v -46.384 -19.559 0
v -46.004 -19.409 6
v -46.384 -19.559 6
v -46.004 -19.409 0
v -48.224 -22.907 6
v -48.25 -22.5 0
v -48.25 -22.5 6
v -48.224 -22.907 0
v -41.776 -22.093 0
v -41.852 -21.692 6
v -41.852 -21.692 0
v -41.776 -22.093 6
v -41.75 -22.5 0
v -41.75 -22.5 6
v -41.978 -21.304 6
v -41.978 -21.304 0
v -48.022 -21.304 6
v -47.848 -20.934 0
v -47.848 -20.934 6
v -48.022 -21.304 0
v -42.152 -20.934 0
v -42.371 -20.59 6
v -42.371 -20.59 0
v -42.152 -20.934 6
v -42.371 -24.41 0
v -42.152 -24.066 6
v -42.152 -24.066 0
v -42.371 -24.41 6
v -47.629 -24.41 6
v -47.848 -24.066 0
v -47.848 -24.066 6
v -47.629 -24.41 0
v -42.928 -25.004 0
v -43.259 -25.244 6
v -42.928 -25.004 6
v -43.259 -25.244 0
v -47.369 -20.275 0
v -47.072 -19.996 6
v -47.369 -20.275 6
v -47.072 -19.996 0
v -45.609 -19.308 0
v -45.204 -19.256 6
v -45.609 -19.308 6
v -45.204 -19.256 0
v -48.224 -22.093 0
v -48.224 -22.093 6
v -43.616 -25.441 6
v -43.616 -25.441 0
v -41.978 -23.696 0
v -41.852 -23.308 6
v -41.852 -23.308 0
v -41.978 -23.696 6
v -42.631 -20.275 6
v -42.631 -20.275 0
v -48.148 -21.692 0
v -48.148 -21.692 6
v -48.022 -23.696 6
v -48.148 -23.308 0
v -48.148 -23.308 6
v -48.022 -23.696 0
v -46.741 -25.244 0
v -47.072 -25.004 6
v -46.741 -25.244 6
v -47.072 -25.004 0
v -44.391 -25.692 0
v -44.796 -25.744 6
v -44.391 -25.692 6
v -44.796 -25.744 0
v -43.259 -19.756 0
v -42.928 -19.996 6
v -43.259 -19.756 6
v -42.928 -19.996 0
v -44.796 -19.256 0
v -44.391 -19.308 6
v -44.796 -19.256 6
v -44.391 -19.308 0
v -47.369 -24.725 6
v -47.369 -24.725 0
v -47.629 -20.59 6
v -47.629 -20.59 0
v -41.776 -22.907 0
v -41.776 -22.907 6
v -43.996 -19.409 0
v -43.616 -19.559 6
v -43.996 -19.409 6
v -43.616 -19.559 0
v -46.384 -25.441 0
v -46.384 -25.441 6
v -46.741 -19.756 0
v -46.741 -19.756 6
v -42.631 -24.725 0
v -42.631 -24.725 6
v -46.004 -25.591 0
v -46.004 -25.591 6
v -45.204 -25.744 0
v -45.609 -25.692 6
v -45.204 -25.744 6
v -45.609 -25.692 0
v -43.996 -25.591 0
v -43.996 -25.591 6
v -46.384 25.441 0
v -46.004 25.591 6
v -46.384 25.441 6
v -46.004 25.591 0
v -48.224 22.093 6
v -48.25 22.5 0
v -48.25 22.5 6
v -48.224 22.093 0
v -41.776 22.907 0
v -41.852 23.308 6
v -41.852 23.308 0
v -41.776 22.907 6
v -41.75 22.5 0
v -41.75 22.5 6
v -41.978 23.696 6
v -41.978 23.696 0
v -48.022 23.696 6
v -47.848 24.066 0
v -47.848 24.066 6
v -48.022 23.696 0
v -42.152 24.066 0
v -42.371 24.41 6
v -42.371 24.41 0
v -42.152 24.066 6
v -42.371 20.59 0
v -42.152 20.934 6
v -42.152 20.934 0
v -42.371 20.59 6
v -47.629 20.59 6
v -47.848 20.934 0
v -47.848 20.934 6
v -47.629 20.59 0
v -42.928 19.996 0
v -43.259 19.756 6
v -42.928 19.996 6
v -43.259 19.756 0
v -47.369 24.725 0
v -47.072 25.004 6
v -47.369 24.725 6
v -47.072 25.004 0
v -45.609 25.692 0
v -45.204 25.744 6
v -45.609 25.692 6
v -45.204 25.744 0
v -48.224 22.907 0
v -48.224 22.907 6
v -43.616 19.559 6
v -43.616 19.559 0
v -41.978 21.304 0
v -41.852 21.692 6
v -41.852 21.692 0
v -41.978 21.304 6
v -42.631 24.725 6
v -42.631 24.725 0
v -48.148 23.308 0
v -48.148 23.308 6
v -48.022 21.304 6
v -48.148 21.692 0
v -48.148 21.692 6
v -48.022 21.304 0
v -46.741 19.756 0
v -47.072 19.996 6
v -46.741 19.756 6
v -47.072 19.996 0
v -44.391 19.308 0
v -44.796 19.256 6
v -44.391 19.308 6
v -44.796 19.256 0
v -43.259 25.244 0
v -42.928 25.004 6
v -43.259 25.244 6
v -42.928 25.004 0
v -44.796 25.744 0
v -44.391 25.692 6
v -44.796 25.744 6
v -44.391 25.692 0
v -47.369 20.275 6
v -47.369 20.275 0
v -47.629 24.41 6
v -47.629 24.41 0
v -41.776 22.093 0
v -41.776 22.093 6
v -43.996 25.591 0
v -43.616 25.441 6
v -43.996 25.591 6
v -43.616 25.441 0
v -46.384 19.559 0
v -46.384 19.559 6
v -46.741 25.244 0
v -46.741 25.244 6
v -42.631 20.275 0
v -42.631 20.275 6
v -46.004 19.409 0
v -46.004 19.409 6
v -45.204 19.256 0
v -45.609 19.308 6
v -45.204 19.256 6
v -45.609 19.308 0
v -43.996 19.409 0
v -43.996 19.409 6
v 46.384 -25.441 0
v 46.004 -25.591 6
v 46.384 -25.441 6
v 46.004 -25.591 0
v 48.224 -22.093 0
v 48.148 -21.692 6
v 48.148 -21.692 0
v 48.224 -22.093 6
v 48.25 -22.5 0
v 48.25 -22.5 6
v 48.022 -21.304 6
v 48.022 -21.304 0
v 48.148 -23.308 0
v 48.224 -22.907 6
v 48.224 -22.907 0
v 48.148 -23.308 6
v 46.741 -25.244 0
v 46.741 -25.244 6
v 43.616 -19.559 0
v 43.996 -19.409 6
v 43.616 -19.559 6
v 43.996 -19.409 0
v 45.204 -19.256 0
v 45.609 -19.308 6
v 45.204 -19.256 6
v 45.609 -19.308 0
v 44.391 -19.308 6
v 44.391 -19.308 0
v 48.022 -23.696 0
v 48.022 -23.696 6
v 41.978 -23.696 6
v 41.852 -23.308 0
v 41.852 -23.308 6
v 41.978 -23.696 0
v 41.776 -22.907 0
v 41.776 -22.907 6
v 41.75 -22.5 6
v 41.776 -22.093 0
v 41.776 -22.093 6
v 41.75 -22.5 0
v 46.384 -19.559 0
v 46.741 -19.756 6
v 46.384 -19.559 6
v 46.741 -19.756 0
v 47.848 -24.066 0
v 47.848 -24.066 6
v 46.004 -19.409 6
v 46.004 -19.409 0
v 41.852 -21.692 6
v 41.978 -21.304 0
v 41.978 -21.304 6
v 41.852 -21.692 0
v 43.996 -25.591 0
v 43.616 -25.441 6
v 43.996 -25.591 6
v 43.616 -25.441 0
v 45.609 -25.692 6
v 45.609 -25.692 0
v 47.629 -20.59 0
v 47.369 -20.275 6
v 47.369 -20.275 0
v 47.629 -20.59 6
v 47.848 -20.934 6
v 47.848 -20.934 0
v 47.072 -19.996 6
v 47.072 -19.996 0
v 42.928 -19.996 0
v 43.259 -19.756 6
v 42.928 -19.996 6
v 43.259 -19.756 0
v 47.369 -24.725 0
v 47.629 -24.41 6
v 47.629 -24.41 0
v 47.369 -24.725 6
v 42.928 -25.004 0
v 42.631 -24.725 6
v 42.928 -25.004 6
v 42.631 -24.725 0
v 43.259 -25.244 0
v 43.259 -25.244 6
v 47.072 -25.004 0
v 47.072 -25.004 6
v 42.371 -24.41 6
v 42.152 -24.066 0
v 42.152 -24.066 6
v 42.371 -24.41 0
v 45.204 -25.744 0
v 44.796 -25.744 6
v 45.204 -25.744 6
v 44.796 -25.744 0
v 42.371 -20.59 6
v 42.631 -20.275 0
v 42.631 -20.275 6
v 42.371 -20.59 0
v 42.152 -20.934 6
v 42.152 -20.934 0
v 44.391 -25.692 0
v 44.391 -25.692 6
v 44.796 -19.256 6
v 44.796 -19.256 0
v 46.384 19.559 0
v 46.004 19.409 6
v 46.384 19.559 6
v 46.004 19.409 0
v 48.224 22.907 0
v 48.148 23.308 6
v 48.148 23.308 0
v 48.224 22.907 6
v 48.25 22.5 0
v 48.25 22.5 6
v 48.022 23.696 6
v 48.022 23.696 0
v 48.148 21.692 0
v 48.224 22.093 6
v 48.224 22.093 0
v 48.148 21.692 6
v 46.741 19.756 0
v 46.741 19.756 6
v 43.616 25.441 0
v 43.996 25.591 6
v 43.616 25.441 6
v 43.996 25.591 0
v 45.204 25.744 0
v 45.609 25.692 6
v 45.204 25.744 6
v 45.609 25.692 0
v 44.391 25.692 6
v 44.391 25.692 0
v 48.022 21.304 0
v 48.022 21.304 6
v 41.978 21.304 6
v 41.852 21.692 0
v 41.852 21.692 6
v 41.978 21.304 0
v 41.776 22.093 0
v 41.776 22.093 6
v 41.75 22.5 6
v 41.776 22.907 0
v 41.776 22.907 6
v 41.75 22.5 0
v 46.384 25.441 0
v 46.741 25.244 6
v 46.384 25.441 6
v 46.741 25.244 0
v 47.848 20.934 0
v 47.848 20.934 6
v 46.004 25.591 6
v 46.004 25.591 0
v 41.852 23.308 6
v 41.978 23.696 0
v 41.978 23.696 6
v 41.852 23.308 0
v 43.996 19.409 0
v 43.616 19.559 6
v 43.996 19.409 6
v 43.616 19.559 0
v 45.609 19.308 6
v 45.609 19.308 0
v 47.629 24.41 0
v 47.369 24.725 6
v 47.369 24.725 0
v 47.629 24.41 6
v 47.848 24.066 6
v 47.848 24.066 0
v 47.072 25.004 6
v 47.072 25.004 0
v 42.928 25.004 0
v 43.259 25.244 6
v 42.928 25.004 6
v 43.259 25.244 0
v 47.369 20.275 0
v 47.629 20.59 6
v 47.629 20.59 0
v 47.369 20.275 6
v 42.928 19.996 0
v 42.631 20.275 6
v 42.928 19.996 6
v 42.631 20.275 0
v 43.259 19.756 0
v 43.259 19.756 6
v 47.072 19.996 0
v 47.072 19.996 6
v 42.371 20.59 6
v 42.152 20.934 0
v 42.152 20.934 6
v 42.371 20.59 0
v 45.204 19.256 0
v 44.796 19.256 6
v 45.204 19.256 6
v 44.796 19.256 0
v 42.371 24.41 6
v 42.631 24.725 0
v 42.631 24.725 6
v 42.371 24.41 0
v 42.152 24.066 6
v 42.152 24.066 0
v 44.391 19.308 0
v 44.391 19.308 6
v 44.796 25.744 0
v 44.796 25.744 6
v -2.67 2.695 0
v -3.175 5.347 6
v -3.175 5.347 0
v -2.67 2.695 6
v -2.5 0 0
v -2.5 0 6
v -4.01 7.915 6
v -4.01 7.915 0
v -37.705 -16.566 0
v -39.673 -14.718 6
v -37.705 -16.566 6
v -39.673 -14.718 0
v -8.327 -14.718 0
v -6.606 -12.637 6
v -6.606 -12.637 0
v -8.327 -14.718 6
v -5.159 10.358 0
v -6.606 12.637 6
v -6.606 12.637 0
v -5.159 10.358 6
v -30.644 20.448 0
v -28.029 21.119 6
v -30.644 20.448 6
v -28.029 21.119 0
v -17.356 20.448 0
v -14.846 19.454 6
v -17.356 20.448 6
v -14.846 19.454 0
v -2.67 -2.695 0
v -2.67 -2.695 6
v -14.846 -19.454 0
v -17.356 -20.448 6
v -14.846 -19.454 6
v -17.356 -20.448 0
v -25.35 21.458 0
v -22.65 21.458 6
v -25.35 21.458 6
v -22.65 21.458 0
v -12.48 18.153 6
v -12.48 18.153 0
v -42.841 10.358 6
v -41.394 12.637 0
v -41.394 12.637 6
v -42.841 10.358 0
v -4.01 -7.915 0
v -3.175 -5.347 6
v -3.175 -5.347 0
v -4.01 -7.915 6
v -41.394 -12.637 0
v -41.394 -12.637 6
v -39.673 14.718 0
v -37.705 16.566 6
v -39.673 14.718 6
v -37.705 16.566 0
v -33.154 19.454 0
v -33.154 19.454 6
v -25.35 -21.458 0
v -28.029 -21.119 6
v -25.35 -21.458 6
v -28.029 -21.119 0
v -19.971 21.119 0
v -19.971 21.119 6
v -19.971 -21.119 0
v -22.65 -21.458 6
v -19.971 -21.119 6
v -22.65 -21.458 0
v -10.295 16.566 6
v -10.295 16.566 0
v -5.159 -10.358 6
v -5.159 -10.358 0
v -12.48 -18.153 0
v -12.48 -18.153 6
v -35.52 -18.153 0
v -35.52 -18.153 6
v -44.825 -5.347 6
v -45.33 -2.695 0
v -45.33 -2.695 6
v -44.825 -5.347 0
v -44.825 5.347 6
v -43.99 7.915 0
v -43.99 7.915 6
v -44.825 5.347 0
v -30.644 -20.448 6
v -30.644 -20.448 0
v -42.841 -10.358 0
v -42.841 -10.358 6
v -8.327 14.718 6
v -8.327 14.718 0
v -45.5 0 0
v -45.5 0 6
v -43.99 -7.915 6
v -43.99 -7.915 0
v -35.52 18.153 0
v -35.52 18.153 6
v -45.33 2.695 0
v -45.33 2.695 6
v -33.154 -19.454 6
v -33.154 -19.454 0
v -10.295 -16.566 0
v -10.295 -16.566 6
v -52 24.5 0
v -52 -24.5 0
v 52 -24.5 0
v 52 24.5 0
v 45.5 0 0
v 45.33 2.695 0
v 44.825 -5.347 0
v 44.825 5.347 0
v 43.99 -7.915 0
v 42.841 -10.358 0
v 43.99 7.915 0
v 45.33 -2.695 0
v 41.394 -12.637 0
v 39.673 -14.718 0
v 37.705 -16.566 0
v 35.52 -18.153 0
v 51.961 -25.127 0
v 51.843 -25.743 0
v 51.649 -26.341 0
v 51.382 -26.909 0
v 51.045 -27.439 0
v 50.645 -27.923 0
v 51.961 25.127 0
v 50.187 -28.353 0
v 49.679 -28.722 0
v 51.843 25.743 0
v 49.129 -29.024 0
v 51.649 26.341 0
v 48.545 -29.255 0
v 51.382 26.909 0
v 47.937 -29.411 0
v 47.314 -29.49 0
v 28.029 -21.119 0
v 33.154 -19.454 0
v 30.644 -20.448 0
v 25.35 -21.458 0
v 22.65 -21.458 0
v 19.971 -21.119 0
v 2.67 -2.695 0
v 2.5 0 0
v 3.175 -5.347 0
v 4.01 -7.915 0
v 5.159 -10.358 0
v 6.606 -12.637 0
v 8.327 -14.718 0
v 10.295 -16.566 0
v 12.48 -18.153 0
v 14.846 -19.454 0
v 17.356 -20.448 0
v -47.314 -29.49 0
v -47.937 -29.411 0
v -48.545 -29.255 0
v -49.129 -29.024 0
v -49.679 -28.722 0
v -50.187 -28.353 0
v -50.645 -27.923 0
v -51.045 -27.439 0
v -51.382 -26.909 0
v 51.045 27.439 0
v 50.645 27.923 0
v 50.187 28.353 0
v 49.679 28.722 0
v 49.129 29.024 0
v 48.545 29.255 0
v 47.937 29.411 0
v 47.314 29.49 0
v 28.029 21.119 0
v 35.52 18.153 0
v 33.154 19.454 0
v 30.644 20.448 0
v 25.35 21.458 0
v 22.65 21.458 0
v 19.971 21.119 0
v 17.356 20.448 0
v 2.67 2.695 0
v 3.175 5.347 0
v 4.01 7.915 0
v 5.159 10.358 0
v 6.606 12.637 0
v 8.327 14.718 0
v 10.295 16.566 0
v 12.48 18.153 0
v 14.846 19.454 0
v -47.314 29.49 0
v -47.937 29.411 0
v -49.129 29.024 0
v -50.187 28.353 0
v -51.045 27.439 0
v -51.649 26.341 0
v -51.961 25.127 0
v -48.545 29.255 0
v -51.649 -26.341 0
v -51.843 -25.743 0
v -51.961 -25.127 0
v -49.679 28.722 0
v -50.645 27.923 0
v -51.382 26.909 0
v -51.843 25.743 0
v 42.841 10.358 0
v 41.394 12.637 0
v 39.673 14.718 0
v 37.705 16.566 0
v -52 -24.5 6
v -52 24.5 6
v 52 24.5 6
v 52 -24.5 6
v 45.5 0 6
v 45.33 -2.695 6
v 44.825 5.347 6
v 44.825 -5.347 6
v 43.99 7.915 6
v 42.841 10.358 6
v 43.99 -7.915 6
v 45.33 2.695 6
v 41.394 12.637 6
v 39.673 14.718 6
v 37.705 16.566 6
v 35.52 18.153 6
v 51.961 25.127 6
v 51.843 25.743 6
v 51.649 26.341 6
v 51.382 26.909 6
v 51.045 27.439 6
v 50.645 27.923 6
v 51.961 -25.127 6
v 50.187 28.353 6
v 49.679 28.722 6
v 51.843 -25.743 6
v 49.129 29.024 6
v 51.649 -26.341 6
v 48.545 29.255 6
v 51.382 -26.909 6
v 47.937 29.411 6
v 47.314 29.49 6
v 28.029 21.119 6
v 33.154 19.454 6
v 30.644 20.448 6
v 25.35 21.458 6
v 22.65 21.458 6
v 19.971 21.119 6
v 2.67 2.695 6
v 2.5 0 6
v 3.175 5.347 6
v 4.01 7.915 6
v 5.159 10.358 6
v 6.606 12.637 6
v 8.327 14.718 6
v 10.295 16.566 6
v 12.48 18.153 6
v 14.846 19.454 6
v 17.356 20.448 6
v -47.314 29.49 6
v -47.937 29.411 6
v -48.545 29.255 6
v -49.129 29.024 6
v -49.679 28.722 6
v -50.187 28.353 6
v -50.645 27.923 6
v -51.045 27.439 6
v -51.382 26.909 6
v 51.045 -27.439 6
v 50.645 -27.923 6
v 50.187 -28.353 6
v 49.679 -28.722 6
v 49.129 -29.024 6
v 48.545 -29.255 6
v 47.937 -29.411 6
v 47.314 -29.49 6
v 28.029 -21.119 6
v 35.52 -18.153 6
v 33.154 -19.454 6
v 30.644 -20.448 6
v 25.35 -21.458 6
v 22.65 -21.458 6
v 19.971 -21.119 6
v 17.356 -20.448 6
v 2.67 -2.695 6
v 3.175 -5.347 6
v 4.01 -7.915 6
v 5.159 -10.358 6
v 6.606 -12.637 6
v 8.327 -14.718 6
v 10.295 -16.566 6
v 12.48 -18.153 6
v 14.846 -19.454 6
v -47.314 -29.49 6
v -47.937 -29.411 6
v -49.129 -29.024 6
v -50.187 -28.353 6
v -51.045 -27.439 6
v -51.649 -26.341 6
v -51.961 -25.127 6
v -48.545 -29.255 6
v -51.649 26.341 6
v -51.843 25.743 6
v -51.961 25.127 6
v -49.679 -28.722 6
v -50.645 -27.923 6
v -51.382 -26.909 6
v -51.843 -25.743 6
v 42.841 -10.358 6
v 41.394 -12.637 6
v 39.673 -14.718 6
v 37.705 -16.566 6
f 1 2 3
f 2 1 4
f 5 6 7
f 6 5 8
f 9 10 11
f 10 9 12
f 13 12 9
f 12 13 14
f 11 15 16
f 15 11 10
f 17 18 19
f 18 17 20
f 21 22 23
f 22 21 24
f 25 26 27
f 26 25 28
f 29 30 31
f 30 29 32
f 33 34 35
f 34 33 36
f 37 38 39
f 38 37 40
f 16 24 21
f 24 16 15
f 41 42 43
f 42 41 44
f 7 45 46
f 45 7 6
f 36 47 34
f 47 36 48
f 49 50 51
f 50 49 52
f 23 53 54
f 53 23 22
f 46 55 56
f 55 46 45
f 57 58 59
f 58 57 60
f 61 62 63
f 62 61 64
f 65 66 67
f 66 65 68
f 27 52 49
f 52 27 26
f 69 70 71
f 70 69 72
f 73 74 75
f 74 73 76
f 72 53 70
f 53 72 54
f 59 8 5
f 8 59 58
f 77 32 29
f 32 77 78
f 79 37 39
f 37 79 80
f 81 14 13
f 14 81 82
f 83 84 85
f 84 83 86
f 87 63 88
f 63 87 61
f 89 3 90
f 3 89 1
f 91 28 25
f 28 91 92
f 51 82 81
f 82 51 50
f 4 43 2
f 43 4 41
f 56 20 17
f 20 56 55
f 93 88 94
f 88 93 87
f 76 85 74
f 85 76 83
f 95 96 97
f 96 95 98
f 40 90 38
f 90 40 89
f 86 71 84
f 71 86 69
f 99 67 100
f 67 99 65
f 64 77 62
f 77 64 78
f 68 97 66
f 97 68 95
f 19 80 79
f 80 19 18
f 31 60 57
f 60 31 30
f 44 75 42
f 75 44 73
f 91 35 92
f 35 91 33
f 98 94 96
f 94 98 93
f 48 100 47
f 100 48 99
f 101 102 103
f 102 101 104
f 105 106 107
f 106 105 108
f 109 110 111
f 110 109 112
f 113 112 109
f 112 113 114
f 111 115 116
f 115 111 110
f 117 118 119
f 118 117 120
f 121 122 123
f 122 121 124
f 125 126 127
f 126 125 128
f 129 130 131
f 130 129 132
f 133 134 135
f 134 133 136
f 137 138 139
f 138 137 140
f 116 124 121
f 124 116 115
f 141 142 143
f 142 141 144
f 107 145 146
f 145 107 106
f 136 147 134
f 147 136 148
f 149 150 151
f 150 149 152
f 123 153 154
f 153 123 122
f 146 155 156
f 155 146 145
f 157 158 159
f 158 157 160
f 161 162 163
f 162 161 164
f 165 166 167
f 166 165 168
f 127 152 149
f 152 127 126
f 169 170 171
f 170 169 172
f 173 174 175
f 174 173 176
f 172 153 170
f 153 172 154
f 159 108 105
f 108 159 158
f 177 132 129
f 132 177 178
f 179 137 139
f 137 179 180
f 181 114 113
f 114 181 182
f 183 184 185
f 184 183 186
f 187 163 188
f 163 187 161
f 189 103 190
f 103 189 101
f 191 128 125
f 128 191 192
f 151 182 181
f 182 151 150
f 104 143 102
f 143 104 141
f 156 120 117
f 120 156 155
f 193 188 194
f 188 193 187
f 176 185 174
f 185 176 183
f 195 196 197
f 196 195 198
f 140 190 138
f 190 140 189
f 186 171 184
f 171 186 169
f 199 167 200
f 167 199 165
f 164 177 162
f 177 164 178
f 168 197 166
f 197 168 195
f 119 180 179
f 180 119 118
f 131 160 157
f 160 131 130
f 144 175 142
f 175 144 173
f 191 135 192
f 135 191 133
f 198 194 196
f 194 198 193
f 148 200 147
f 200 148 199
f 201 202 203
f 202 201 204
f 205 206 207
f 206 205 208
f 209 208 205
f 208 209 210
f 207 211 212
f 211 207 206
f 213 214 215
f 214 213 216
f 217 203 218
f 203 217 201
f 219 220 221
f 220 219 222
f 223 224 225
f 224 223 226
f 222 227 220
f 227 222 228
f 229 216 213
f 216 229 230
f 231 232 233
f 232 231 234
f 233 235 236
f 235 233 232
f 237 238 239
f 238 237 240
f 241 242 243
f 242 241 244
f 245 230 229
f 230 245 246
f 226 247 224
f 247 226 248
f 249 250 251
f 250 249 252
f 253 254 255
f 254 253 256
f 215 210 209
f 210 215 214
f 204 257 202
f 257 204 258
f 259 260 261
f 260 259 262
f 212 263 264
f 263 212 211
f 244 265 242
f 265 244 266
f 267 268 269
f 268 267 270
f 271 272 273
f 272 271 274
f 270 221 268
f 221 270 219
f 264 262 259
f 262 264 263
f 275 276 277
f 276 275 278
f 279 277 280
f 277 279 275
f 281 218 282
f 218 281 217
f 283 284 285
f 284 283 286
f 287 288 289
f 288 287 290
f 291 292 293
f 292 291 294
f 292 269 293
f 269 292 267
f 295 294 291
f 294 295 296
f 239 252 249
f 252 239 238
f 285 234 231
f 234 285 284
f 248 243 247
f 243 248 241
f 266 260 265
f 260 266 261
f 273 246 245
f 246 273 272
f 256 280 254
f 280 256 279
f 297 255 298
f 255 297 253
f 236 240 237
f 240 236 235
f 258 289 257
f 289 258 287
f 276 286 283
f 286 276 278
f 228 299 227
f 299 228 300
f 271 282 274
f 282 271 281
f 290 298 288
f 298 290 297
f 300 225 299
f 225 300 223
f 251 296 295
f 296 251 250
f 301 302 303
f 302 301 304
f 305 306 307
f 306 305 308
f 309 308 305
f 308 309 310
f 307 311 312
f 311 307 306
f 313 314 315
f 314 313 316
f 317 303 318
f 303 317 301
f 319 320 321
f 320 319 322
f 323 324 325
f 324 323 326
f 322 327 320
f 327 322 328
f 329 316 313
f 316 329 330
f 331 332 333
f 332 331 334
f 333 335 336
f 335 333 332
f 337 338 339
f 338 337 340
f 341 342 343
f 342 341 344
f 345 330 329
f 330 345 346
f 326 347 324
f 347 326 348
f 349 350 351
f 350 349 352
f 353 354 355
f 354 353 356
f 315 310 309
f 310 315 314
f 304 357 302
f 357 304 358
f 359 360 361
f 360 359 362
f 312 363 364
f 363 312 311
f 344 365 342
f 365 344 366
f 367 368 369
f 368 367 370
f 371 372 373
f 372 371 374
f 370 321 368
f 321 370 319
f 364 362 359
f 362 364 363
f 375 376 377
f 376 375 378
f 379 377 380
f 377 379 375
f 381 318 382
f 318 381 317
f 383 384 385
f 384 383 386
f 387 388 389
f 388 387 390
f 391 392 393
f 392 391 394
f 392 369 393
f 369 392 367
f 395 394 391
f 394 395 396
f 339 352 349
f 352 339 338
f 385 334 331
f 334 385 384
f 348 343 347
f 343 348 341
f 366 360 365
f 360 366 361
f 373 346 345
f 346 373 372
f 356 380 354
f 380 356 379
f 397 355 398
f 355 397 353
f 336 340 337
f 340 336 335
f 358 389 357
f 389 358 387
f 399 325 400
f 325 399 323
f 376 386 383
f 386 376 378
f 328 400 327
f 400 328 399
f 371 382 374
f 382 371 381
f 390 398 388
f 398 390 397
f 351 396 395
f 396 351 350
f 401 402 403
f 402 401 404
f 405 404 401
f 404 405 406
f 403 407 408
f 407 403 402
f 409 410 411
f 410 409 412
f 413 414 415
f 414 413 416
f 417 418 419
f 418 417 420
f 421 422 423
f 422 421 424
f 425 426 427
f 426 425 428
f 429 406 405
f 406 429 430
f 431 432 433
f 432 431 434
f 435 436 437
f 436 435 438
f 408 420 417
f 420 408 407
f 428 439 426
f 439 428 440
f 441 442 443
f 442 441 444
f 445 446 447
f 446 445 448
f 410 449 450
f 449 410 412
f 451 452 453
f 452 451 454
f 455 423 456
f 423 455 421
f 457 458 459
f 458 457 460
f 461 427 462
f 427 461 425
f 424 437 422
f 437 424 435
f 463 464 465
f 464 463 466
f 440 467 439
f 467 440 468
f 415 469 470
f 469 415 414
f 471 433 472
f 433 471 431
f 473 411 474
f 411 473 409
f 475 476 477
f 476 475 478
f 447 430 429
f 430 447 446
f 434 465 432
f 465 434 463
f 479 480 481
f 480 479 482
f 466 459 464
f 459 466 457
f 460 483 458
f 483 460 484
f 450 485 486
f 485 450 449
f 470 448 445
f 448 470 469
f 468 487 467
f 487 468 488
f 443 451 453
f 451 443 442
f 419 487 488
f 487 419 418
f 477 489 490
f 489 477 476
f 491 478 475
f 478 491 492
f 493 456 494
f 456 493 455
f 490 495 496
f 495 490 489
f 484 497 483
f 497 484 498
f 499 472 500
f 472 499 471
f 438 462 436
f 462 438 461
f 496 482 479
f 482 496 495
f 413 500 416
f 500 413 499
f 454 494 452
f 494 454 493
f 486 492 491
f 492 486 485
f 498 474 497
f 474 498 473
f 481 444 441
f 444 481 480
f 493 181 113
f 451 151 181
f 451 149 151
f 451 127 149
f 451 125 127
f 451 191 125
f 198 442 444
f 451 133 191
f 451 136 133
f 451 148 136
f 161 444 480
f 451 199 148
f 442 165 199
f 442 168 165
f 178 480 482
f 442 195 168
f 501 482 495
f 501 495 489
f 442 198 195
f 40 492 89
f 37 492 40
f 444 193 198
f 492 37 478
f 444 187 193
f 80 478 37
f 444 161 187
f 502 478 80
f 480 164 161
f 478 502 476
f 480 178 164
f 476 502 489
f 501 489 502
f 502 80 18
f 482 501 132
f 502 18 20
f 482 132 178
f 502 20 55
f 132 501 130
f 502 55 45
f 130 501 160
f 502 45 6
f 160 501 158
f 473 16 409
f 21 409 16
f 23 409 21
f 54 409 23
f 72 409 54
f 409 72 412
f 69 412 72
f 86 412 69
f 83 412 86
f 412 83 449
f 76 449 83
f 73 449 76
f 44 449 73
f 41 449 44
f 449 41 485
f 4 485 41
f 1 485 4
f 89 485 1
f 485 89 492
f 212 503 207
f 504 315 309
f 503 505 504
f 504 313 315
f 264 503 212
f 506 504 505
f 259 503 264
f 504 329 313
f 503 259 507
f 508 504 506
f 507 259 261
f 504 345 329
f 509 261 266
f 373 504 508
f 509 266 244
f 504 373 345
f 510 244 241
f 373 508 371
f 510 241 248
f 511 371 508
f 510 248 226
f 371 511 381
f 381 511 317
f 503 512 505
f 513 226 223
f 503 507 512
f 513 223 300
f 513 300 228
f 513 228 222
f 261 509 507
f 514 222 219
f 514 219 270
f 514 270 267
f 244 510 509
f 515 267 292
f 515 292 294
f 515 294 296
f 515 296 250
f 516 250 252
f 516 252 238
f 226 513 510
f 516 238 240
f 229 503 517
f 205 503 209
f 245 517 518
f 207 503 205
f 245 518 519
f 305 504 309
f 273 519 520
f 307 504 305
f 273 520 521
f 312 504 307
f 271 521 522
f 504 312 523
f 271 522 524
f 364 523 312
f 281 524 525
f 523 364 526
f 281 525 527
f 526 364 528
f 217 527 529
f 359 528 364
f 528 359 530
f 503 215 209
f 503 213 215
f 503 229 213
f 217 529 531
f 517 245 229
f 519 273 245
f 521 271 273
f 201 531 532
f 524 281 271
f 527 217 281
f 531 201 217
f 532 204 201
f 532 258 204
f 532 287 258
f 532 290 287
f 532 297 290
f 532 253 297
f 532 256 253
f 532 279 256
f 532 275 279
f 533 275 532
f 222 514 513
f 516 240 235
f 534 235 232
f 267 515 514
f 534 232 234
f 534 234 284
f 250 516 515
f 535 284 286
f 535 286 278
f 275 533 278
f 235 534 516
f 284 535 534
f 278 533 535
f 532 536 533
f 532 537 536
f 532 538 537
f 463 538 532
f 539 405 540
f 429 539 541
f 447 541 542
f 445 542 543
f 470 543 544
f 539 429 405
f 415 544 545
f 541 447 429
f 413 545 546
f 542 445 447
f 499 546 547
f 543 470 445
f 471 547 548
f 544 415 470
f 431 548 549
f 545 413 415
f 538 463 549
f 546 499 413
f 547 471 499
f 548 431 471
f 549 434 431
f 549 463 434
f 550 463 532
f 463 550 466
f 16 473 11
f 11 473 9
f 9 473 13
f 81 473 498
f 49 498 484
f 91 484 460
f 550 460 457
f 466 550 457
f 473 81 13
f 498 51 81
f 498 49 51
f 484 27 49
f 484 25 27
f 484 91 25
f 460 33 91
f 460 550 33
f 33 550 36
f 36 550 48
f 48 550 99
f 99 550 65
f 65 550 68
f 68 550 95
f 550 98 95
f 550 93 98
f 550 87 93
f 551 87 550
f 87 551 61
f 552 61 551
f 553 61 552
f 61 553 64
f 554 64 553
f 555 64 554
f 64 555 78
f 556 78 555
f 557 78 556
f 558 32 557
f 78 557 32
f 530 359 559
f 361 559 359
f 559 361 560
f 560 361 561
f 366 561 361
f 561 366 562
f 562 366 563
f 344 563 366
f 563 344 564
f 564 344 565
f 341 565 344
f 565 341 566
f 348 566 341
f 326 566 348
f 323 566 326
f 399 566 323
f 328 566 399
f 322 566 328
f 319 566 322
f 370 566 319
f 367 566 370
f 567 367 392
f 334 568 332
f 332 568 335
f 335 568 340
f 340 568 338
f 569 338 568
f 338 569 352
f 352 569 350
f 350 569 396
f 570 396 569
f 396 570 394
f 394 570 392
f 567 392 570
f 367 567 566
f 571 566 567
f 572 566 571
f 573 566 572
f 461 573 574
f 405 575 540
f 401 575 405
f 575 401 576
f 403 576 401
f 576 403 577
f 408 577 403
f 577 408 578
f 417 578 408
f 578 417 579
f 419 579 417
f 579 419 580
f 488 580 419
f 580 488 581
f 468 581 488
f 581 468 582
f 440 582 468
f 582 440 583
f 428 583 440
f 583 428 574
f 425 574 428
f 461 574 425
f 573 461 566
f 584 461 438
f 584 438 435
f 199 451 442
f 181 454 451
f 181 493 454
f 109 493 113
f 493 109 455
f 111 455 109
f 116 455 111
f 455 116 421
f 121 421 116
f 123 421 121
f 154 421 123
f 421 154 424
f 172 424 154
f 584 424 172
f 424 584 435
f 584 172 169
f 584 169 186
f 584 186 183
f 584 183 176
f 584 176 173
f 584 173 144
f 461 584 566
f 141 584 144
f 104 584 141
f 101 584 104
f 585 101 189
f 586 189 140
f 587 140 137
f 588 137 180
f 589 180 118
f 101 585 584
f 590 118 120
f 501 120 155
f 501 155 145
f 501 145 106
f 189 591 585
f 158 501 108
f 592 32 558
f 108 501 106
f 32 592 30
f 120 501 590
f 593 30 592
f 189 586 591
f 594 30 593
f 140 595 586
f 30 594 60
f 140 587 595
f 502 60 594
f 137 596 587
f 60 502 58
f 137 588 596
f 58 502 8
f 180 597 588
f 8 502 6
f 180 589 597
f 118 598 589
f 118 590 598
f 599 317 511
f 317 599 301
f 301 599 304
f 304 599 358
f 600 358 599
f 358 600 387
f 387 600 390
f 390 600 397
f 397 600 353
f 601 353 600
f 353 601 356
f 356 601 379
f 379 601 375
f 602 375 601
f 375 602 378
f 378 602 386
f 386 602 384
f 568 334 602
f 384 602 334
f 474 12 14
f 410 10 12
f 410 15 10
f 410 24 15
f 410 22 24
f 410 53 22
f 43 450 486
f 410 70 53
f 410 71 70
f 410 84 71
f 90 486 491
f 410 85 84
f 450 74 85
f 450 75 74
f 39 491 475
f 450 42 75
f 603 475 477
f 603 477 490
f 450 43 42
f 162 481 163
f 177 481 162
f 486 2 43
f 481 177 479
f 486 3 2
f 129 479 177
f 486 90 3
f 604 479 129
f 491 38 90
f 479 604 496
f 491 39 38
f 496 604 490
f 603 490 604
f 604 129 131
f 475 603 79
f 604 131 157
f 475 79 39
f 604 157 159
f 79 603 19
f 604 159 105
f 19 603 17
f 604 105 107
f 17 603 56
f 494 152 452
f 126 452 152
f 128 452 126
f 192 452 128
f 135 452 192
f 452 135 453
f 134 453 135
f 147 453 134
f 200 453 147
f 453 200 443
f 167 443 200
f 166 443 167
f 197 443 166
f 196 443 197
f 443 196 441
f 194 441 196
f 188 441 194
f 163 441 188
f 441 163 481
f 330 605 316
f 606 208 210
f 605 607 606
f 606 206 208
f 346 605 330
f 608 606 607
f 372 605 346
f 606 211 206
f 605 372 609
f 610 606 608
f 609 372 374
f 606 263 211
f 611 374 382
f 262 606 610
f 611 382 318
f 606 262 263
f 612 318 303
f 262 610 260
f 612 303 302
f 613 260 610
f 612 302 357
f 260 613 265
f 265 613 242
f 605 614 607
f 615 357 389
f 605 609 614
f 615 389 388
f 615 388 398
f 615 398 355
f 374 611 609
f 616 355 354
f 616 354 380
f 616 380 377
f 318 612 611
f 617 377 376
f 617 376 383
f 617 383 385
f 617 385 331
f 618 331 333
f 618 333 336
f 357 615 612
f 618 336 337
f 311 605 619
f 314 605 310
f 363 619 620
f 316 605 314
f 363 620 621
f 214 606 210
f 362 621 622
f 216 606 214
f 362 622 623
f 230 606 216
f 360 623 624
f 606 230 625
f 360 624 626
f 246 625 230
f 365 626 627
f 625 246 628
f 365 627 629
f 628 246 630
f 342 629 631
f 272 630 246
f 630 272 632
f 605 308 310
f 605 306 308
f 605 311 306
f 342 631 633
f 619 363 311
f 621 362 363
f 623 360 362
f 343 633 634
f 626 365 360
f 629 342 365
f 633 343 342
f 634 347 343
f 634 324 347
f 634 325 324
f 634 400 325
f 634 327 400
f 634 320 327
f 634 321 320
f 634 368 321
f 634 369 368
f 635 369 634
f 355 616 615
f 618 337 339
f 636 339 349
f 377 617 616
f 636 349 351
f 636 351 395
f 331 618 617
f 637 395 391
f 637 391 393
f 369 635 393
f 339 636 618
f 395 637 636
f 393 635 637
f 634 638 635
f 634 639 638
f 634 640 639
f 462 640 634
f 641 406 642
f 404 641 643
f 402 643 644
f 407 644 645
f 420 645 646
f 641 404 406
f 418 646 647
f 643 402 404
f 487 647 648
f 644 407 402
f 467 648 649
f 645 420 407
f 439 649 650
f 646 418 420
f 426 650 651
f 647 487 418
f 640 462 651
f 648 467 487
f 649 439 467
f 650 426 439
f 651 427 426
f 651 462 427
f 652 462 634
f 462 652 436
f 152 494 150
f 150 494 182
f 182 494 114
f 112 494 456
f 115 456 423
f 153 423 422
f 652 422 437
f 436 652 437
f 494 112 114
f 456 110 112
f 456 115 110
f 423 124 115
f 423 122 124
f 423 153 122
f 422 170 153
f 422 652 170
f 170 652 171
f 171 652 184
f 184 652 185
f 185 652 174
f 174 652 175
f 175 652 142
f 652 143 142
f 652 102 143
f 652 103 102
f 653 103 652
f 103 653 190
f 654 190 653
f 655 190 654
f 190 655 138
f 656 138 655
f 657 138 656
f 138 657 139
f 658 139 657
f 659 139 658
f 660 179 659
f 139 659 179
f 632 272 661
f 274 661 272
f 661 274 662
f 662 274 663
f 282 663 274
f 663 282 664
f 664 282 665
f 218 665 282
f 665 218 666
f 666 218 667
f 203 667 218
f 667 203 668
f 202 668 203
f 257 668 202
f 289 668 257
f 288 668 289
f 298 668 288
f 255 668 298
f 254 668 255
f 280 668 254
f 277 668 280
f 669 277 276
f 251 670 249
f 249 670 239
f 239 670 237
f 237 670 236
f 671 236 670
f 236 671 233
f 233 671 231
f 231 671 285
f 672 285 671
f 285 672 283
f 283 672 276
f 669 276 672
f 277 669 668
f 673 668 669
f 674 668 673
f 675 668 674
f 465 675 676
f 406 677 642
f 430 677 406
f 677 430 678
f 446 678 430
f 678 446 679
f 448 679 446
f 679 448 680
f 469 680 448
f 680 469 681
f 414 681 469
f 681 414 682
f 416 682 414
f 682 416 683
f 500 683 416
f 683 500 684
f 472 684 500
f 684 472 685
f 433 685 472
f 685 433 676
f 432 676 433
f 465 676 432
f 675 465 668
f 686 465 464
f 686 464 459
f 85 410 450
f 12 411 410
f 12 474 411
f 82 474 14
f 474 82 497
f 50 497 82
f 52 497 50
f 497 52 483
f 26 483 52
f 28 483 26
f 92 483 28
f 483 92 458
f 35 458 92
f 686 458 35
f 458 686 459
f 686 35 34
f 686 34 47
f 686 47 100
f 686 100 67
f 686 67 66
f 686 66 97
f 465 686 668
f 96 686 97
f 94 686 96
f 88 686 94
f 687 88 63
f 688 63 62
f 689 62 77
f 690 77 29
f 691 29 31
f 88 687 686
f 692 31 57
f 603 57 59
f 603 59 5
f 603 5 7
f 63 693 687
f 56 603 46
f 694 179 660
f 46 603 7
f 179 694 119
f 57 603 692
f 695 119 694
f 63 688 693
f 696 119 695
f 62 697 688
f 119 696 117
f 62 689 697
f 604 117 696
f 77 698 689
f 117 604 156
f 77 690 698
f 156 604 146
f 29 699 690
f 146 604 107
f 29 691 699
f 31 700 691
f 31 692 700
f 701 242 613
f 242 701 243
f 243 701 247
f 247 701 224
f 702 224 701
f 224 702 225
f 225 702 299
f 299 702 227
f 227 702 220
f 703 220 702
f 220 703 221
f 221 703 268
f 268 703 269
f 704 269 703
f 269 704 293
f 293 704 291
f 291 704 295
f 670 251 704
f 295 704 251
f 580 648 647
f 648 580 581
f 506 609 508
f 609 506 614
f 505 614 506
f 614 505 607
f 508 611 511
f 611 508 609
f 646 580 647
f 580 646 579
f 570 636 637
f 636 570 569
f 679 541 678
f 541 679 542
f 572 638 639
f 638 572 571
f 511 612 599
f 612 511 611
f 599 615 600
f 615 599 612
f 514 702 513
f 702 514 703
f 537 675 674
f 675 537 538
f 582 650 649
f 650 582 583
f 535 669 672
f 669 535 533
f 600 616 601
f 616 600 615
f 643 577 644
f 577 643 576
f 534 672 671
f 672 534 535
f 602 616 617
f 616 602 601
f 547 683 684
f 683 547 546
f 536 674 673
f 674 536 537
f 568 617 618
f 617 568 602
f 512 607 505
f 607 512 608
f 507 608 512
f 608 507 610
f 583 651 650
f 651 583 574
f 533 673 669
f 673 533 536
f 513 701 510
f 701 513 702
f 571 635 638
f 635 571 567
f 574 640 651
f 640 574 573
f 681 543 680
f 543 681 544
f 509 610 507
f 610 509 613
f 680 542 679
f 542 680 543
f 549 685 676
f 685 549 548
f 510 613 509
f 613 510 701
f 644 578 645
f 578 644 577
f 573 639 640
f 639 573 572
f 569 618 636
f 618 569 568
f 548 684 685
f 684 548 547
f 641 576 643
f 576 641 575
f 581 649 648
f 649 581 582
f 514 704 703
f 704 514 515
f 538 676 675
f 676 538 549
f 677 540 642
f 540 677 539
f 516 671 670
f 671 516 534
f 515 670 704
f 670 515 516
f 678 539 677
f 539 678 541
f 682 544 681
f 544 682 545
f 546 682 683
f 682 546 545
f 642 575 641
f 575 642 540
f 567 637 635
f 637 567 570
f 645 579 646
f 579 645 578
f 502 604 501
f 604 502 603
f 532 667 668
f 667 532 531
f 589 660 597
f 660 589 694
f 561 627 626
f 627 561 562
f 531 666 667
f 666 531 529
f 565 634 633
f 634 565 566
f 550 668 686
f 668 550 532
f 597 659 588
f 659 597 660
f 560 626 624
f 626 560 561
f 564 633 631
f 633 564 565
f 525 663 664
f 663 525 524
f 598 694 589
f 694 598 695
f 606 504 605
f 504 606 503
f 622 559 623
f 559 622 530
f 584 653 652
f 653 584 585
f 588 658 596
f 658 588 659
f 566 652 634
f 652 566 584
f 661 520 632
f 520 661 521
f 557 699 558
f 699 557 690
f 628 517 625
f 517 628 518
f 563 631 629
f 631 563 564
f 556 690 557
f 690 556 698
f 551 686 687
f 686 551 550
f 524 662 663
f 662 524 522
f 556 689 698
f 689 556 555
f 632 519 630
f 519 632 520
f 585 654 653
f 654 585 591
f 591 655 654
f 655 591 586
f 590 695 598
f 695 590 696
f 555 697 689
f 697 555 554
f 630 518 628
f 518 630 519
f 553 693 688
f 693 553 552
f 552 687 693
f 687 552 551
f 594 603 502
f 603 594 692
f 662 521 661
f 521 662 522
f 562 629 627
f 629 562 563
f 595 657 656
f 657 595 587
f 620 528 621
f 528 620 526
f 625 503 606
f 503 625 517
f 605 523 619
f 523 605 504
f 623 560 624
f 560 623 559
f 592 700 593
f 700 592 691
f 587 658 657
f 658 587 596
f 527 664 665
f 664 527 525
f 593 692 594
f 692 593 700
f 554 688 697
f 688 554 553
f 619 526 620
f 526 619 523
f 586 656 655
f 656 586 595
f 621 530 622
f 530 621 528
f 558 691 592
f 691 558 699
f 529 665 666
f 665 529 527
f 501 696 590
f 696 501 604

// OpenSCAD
$fn = 50;


difference() {
	union() {
		hull() {
			translate(v = [-47.0000000000, 24.5000000000, 0]) {
				cylinder(h = 6, r = 5);
			}
			translate(v = [47.0000000000, 24.5000000000, 0]) {
				cylinder(h = 6, r = 5);
			}
			translate(v = [-47.0000000000, -24.5000000000, 0]) {
				cylinder(h = 6, r = 5);
			}
			translate(v = [47.0000000000, -24.5000000000, 0]) {
				cylinder(h = 6, r = 5);
			}
		}
	}
	union() {
		#translate(v = [-45.0000000000, -22.5000000000, -100.0000000000]) {
			cylinder(h = 200, r = 3.2500000000);
		}
		#translate(v = [-45.0000000000, 22.5000000000, -100.0000000000]) {
			cylinder(h = 200, r = 3.2500000000);
		}
		#translate(v = [45.0000000000, -22.5000000000, -100.0000000000]) {
			cylinder(h = 200, r = 3.2500000000);
		}
		#translate(v = [45.0000000000, 22.5000000000, -100.0000000000]) {
			cylinder(h = 200, r = 3.2500000000);
		}
		#translate(v = [-24.0000000000, 0, 0]) {
			cylinder(h = 6, r = 21.5000000000);
		}
		#translate(v = [24.0000000000, 0, 0]) {
			cylinder(h = 6, r = 21.5000000000);
		}
	}
}
